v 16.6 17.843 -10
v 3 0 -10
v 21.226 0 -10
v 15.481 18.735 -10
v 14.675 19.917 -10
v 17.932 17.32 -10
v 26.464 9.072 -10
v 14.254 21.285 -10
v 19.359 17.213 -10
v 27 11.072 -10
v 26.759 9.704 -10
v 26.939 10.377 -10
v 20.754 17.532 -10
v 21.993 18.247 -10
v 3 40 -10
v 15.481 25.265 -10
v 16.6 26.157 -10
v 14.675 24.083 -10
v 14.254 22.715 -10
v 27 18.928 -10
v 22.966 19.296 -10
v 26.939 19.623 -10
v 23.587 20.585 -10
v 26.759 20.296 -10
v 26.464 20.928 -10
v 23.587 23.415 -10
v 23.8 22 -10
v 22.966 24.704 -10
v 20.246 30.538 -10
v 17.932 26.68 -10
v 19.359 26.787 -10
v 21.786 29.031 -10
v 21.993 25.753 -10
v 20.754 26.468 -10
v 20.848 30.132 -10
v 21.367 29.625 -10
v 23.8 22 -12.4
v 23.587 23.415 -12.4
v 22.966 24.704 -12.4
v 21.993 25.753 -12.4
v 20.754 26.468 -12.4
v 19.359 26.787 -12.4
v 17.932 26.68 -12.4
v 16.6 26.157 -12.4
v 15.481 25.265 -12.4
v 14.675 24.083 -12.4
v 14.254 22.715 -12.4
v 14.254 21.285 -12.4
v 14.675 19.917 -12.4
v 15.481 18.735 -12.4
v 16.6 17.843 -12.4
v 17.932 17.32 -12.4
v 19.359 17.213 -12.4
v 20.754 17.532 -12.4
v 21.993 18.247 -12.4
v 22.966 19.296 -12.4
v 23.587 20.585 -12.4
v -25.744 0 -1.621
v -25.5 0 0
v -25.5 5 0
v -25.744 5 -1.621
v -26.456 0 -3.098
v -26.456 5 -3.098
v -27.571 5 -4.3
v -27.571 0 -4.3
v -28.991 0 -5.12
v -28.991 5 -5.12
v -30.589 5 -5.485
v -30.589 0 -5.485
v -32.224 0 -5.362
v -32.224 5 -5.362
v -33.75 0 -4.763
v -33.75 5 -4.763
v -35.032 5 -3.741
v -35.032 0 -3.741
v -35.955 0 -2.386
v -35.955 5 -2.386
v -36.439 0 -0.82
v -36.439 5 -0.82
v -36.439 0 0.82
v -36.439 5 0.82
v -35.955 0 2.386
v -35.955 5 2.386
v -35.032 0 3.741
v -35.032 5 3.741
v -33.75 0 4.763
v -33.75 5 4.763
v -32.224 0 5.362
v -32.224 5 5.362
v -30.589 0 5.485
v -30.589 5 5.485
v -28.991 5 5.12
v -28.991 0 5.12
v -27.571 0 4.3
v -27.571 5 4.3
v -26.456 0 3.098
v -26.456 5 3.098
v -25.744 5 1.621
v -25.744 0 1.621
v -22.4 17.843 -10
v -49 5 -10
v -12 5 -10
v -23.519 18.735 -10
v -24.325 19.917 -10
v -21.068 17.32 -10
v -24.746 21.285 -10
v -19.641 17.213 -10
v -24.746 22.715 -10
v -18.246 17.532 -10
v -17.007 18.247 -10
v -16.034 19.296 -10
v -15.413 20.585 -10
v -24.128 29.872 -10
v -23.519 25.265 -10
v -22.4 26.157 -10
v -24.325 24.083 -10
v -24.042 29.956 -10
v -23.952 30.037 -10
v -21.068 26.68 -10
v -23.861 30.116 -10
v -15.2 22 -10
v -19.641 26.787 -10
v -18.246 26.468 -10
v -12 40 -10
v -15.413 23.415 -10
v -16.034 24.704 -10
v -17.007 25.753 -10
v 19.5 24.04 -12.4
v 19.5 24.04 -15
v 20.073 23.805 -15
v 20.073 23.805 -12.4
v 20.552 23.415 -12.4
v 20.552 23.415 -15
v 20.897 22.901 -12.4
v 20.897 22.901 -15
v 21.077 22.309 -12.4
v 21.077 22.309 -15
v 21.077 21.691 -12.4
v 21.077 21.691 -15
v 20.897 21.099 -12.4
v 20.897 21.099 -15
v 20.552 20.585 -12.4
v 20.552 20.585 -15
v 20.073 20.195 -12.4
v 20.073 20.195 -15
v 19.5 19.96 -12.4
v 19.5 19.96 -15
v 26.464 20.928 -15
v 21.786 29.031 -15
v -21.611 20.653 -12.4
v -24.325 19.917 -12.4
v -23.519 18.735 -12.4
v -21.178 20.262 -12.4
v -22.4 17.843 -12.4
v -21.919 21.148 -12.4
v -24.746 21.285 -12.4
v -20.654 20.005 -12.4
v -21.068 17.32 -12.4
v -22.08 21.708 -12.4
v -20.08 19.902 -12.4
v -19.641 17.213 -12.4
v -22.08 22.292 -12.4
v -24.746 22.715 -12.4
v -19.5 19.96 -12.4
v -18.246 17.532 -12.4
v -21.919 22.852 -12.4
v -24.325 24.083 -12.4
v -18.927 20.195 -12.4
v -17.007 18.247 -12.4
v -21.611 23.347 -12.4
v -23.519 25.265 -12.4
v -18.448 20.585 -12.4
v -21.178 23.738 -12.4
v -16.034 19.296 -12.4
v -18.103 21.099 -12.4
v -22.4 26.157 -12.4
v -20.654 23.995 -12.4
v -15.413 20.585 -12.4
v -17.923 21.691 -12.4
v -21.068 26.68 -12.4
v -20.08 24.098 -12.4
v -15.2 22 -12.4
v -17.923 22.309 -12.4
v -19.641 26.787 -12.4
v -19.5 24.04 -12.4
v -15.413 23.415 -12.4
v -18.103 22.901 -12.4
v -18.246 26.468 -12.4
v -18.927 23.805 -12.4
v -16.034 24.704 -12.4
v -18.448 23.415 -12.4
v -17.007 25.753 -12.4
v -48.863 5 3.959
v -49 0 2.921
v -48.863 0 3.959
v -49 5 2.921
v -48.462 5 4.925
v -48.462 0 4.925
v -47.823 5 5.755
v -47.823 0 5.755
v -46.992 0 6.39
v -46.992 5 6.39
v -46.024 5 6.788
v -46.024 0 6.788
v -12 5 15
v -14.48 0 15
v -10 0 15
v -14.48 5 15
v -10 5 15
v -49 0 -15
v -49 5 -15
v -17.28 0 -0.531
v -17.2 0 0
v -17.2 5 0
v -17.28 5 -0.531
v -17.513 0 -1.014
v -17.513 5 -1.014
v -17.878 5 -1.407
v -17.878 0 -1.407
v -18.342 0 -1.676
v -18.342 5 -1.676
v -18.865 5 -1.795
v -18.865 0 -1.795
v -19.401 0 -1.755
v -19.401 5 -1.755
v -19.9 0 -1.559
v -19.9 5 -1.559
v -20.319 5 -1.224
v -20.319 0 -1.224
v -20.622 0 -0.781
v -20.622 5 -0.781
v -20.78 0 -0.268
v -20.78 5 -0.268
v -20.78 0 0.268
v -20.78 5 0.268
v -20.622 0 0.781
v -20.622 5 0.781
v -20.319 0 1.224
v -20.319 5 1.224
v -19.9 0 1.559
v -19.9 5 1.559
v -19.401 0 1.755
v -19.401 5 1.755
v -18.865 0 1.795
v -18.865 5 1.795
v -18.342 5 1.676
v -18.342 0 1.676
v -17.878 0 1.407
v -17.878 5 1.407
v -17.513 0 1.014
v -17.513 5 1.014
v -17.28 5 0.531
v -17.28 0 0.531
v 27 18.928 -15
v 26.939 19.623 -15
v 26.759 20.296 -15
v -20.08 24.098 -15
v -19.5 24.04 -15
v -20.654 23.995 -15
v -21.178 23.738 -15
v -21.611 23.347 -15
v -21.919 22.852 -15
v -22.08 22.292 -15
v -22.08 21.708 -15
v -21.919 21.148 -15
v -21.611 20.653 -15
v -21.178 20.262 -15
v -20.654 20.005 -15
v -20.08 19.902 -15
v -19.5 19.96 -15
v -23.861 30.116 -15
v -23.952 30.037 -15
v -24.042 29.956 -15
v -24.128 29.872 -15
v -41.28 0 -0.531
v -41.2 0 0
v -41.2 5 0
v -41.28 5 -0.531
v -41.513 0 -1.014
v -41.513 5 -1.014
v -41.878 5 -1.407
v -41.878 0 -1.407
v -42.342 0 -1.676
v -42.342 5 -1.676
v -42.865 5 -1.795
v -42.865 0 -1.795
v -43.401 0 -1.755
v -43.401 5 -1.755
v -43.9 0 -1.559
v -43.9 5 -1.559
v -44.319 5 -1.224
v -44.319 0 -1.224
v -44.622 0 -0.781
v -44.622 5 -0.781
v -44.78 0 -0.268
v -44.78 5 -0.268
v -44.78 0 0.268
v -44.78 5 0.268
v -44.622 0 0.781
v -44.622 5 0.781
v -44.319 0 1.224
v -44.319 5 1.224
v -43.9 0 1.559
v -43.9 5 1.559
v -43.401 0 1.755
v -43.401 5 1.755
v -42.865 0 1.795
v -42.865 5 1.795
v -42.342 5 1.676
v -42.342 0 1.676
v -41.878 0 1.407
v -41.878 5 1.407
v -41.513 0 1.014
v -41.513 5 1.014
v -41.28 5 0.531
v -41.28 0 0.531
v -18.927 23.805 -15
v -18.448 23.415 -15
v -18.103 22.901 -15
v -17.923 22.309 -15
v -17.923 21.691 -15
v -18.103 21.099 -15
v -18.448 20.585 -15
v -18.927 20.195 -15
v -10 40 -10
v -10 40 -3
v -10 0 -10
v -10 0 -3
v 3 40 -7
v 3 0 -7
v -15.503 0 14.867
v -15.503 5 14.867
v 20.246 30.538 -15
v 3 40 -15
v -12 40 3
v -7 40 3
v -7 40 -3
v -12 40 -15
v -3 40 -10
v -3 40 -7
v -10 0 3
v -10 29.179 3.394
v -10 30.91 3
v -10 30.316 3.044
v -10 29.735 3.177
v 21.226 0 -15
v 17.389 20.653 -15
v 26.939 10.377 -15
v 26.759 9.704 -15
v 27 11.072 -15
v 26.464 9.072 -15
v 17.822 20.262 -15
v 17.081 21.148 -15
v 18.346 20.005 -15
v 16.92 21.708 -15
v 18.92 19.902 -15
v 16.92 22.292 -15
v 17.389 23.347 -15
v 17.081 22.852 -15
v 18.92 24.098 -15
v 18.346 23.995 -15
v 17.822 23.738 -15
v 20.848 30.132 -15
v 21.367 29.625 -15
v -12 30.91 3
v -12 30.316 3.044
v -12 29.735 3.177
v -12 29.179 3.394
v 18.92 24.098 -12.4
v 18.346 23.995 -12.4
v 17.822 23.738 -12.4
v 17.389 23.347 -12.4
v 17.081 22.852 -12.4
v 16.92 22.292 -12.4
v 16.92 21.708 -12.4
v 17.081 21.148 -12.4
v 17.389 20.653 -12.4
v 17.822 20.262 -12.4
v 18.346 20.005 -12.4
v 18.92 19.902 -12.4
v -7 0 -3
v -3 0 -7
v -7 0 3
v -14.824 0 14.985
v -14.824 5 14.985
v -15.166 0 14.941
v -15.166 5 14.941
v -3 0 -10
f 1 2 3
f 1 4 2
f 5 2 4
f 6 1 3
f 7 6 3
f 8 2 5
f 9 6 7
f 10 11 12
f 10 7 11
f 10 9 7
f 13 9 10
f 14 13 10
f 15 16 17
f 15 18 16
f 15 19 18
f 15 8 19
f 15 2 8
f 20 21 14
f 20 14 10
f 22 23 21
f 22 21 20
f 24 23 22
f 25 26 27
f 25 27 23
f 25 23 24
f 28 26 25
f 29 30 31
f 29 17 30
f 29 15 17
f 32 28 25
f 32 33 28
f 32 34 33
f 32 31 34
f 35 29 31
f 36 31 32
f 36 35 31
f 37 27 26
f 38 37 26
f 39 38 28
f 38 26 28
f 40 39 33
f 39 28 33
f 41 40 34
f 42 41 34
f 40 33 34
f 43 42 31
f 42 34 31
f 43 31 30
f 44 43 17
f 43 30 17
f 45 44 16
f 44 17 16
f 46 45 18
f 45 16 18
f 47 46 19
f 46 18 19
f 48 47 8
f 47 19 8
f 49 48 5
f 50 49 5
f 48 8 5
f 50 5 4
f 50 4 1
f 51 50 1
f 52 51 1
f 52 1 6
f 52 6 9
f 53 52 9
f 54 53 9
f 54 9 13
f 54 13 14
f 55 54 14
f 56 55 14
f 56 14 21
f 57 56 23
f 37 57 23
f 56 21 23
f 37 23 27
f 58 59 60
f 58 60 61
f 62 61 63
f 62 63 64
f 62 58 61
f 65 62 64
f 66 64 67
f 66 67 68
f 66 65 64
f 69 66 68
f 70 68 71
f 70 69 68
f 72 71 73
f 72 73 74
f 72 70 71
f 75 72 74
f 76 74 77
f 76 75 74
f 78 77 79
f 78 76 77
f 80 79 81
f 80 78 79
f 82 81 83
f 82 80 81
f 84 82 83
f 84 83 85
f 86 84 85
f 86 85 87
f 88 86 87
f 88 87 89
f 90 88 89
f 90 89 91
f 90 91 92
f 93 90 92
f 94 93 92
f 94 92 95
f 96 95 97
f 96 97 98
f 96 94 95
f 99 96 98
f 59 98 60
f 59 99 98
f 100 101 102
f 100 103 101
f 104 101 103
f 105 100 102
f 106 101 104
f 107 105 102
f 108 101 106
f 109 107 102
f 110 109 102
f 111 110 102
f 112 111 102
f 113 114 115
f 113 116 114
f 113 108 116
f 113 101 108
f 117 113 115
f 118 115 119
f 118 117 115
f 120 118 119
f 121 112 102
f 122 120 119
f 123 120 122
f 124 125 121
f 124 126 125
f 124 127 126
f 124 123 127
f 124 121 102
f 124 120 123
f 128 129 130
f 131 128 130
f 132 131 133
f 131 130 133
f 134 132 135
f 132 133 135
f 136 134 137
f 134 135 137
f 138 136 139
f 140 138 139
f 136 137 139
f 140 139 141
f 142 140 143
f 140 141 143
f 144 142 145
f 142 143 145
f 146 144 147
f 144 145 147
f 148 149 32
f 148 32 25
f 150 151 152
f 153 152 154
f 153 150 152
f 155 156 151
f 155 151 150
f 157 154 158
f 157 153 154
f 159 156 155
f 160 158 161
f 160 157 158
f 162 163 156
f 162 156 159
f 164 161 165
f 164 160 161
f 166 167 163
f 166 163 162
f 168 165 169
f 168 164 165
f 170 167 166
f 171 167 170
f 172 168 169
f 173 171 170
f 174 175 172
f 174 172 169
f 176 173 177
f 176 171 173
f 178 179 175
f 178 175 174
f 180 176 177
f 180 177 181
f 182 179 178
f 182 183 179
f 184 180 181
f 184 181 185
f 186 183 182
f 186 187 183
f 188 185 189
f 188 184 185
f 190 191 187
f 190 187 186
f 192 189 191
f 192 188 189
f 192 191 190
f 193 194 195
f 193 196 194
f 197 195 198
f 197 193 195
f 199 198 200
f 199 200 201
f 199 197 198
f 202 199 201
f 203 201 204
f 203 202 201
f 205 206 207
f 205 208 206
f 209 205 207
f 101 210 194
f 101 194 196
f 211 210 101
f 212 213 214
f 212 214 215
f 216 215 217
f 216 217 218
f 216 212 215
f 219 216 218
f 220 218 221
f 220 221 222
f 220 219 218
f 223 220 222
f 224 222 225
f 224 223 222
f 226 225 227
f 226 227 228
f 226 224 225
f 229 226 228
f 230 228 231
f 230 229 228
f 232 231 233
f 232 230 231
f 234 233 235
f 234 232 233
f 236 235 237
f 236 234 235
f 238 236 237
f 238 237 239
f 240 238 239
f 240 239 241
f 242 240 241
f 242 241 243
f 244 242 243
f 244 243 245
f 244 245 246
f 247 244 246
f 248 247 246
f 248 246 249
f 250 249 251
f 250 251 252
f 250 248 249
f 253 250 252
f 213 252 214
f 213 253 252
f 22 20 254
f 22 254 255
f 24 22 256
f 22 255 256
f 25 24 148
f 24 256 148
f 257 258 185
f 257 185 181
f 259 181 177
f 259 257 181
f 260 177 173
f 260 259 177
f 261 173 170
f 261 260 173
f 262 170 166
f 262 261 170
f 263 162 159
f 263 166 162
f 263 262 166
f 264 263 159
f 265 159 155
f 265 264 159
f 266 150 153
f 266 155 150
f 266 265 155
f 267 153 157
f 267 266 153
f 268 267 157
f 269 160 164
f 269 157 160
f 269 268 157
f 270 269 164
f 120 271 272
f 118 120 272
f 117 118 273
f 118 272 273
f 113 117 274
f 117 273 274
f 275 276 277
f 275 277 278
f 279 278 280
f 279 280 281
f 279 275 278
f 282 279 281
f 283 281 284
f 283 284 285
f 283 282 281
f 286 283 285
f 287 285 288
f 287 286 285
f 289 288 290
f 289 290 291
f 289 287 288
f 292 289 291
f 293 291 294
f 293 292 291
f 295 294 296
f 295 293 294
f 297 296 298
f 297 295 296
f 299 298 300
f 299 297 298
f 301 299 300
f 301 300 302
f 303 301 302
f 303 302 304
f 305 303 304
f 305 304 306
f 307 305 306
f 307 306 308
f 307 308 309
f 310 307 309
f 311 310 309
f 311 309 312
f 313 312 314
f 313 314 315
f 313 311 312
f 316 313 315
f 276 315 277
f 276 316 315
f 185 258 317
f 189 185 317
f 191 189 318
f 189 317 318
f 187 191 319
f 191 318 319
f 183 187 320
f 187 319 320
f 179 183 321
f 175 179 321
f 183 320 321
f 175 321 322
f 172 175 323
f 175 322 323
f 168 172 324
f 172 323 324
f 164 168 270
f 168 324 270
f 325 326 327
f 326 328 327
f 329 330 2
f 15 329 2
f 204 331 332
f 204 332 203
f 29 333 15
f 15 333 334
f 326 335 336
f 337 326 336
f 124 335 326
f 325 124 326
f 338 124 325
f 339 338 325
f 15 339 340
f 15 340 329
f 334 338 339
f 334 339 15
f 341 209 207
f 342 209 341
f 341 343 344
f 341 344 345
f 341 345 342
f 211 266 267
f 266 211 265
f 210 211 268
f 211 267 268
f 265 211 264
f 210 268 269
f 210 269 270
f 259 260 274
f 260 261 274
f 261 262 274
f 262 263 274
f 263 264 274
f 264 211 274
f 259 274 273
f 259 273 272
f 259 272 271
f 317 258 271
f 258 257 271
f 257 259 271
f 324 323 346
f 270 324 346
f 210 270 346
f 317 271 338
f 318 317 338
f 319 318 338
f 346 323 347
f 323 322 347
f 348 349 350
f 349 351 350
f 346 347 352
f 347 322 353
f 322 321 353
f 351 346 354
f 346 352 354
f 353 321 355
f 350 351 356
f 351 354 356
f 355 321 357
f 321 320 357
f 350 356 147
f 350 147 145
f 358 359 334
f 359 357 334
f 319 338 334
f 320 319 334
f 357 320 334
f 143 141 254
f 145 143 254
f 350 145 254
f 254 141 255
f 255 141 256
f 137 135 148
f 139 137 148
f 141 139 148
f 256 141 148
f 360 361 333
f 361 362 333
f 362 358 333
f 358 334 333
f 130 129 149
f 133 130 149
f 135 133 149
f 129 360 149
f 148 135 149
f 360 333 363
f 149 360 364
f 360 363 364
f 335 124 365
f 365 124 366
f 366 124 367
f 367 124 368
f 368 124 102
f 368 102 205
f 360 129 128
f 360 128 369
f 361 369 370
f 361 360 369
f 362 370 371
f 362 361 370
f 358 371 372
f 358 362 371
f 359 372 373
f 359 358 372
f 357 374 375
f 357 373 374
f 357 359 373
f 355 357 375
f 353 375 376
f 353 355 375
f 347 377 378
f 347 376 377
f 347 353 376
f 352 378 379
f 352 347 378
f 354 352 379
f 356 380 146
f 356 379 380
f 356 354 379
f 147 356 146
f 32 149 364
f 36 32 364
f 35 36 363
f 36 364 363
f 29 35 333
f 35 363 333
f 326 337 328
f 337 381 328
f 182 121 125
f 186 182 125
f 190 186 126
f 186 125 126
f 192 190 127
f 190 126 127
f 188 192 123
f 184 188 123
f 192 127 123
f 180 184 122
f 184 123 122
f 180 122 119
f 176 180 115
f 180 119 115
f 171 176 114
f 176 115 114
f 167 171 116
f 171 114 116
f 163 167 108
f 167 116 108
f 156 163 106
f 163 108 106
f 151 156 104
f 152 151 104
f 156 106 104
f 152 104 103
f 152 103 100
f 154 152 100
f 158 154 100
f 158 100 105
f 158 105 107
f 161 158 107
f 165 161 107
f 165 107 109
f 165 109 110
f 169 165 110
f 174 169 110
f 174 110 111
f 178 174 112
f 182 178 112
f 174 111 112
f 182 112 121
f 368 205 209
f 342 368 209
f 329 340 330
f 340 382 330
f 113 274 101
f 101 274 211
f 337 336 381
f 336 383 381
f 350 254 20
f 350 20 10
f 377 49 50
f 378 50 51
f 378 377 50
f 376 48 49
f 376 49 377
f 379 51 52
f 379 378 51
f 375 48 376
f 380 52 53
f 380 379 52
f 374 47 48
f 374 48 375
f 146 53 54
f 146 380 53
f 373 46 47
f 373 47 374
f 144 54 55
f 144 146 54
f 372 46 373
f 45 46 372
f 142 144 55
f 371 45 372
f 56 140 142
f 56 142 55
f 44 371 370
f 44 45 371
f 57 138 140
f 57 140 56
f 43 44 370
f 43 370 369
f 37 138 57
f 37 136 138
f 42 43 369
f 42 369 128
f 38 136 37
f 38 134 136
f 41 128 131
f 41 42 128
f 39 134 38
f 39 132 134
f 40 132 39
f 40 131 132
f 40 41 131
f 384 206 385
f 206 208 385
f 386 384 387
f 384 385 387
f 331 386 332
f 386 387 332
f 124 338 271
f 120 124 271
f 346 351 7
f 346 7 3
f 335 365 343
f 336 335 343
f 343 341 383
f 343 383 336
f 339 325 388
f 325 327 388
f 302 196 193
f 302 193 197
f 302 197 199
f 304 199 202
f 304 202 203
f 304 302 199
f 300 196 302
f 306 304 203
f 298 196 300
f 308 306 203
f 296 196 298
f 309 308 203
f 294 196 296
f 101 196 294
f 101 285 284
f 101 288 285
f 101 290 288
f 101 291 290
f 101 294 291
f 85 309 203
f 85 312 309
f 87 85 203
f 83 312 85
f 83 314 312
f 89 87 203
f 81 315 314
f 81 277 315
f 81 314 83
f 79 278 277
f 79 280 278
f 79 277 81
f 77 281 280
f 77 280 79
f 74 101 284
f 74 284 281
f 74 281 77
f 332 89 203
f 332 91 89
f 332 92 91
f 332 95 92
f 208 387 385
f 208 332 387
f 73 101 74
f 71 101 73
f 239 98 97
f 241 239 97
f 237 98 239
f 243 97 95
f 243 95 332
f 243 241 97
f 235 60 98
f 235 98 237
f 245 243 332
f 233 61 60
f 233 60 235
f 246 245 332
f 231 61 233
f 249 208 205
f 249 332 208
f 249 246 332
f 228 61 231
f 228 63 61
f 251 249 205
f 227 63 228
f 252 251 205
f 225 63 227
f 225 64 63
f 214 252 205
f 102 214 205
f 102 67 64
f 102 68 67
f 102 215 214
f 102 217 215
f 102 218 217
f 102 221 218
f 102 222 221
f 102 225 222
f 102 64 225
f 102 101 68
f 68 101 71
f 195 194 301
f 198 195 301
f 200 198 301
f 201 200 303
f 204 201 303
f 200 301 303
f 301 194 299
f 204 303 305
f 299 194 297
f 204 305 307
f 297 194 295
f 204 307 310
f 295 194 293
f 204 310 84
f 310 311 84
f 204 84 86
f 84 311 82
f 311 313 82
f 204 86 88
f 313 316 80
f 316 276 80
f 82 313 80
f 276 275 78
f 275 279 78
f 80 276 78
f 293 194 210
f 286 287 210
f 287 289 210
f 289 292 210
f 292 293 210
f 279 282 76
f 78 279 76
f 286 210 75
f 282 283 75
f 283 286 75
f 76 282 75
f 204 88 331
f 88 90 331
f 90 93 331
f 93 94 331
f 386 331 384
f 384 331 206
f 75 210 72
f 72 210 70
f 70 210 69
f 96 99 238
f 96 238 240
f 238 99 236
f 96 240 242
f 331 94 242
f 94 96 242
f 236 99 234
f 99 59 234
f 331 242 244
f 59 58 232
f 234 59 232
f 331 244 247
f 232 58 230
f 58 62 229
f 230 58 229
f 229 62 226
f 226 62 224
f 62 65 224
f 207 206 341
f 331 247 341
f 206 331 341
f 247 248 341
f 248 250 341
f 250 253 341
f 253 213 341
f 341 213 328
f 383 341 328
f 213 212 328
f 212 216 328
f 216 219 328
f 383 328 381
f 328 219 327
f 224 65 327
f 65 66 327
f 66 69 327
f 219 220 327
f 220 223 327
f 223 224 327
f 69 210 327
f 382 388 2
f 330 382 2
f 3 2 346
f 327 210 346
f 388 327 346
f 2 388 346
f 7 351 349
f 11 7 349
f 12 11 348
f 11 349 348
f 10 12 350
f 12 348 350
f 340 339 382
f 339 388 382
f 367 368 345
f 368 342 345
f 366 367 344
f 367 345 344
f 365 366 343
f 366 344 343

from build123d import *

# Parameters (mm, degrees)
SKETCH1_W                     = 30
SKETCH1_H                     = 30
BOSS_EXTRUDE1_DEPTH           = 30
SKETCH2_W                     = 20
SKETCH2_H                     = 20
CUT_EXTRUDE1_DEPTH            = 37.742346142
SKETCH3_W                     = 30
SKETCH3_H                     = 5
BOSS_EXTRUDE2_DEPTH           = 40
SKETCH4_R                     = 5.5
SKETCH4_R_2                   = 1.8
CUT_EXTRUDE2_DEPTH            = 65.420493634
CUT_EXTRUDE3_DEPTH            = 63.24949799
SKETCH5_W                     = 5
SKETCH5_H                     = 25
BOSS_EXTRUDE4_DEPTH           = 34
CHAMFER1_SIZE                 = 25
SKETCH8_R                     = 2.1
CUT_EXTRUDE4_DEPTH            = 63.657800791
SKETCH9_W                     = 5
SKETCH9_H                     = 30
BOSS_EXTRUDE5_DEPTH           = 12
CHAMFER2_SIZE                 = 10
CHAMFER2_SIZE2                = 5.773502692
SKETCH10_R                    = 2.1
CUT_EXTRUDE5_DEPTH            = 63.657800791
BODY_MOVE_COPY1_START         = -15
BODY_MOVE_COPY1_DEPTH         = 31
BODY_MOVE_COPY1_START_2       = -10
BODY_MOVE_COPY1_2_DEPTH       = 26
BODY_MOVE_COPY1_3_OUTLINE_W   = 34
BODY_MOVE_COPY1_3_OUTLINE_H   = 5
BODY_MOVE_COPY1_3_DEPTH       = 30
BODY_MOVE_COPY1_4_DEPTH       = 5
BODY_MOVE_COPY1_5_OUTLINE_R   = 5.5
BODY_MOVE_COPY1_5_OUTLINE_R_2 = 1.8
BODY_MOVE_COPY1_5_DEPTH       = 5
SKETCH11_W                    = 3
SKETCH11_H                    = 25
CUT_EXTRUDE6_DEPTH            = 25
SKETCH12_W                    = 25
SKETCH12_H                    = 25
CUT_EXTRUDE7_DEPTH            = 60.380131357
SKETCH13_W                    = 3
SKETCH13_H                    = 6
SKETCH13_W_2                  = 6
SKETCH13_H_2                  = 3
BOSS_EXTRUDE6_DEPTH           = 30
SKETCH14_R                    = 4.8
CUT_EXTRUDE9_DEPTH            = 2.4
CHAMFER3_SIZE                 = 12
CHAMFER3_SIZE2                = 25
FILLET1_R                     = 4
BOSS_EXTRUDE7_DEPTH           = 10
BOSS_EXTRUDE8_DEPTH           = 5
FILLET3_R                     = 4
FILLET4_R                     = 4


with BuildPart() as part:
    # Sketch1 → Boss-Extrude1 (new body)
    with BuildSketch(Plane(origin=(0, 0, 0), x_dir=(1, 0, 0), z_dir=(0, 1, 0))):
        Rectangle(SKETCH1_W, SKETCH1_H)
    extrude(amount=BOSS_EXTRUDE1_DEPTH)

    # Sketch2 → Cut-Extrude1 (cut, through all)
    with BuildSketch(Plane(origin=(0, 30, 0), x_dir=(1, 0, 0), z_dir=(0, 1, 0))):
        Rectangle(SKETCH2_W, SKETCH2_H)
    extrude(amount=-CUT_EXTRUDE1_DEPTH, mode=Mode.SUBTRACT)

    # Sketch3 → Boss-Extrude2 (add)
    with BuildSketch(Plane(origin=(15, 0, 0), x_dir=(0, 0, -1), z_dir=(1, 0, 0))):
        with Locations((0, 2.5)):
            Rectangle(SKETCH3_W, SKETCH3_H)
    extrude(amount=BOSS_EXTRUDE2_DEPTH)

    # Sketch4 → Cut-Extrude2 (cut, through all)
    with BuildSketch(Plane.XZ):
        with Locations(Location((31, 0, 0), (0, 0, 270))):
            Circle(SKETCH4_R)
        with Locations(Location((19, 0, 0), (0, 0, 270))):
            Circle(SKETCH4_R_2)
        with Locations(Location((43, 0, 0), (0, 0, 270))):
            Circle(SKETCH4_R_2)
    extrude(amount=-CUT_EXTRUDE2_DEPTH, mode=Mode.SUBTRACT)

    # Sketch7 → Cut-Extrude3 (cut, through all)
    with BuildSketch(Plane(origin=(0, 5, 0), x_dir=(1, 0, 0), z_dir=(0, 1, 0))):
        Polygon((15, -15), (49, -6), (49, 15), (55, 15), (55, -15), align=None)
    extrude(amount=-CUT_EXTRUDE3_DEPTH, mode=Mode.SUBTRACT)

    # Sketch5 → Boss-Extrude4 (add)
    with BuildSketch(Plane(origin=(15, 0, 0), x_dir=(0, 0, -1), z_dir=(1, 0, 0))):
        with Locations((12.5, 17.5)):
            Rectangle(SKETCH5_W, SKETCH5_H)
    extrude(amount=BOSS_EXTRUDE4_DEPTH)

    # Chamfer1
    chamfer1_edges = [part.edges().sort_by_distance(p)[0] for p in [
        (49, 30, -12.5),
    ]]
    chamfer(chamfer1_edges, length=CHAMFER1_SIZE)

    # Sketch8 → Cut-Extrude4 (cut, through all)
    with BuildSketch(Plane.XY.offset(-10)):
        with Locations((20, 22)):
            Circle(SKETCH8_R)
    extrude(amount=-CUT_EXTRUDE4_DEPTH, mode=Mode.SUBTRACT)

    # Sketch9 → Boss-Extrude5 (add)
    with BuildSketch(Plane.ZY.offset(15)):
        with Locations((-12.5, 15)):
            Rectangle(SKETCH9_W, SKETCH9_H)
    extrude(amount=BOSS_EXTRUDE5_DEPTH)

    # Chamfer2
    chamfer2_edges = [part.edges().sort_by_distance(p)[0] for p in [
        (-27, 30, -12.5),
        (-27, 0, -12.5),
    ]]
    chamfer2_side = [part.faces().sort_by_distance(p)[0] for p in [
        (-27, 15, -12.5),
    ]]
    chamfer(chamfer2_edges, length=CHAMFER2_SIZE, length2=CHAMFER2_SIZE2, reference=chamfer2_side[0])

    # Sketch10 → Cut-Extrude5 (cut, through all)
    with BuildSketch(Plane.XY.offset(-10)):
        with Locations((-19, 22)):
            Circle(SKETCH10_R)
    extrude(amount=-CUT_EXTRUDE5_DEPTH, mode=Mode.SUBTRACT)

    # Body-Move/Copy1: read off the stored shape, not the designer's step
    # Body-Move/Copy1 outline → Body-Move/Copy1 (cut)
    with BuildSketch(Plane.XY.offset(BODY_MOVE_COPY1_START)):
        Polygon((24, 30), (21.226497308, 30), (27, 20), (27, 10), (21.226497308, 0), (49, 0), (49, 5), align=None)
        with BuildLine():
            ThreePointArc((-19.5, 19.960392195), (-21.1, 22), (-19.5, 24.039607805))
            ThreePointArc((-19.5, 24.039607805), (-22.1, 22), (-19.5, 19.960392195))
        make_face()
        with BuildLine():
            ThreePointArc((19.5, 19.960392195), (17.9, 22), (19.5, 24.039607805))
            ThreePointArc((19.5, 24.039607805), (16.9, 22), (19.5, 19.960392195))
        make_face()
    extrude(amount=BODY_MOVE_COPY1_DEPTH, mode=Mode.SUBTRACT)

    # Body-Move_Copy1 2 outline → Body-Move_Copy1 2 (cut)
    with BuildSketch(Plane.XY.offset(BODY_MOVE_COPY1_START_2)):
        Polygon((24.113248654, 5), (15, 5), (15, 0), (21.226497308, 0), align=None)
    extrude(amount=BODY_MOVE_COPY1_2_DEPTH, mode=Mode.SUBTRACT)

    # Body-Move_Copy1 3 outline → Body-Move_Copy1 3 (add)
    with BuildSketch(Plane.XY.offset(BODY_MOVE_COPY1_START)):
        with Locations((-32, 2.5)):
            Rectangle(BODY_MOVE_COPY1_3_OUTLINE_W, BODY_MOVE_COPY1_3_OUTLINE_H)
    extrude(amount=BODY_MOVE_COPY1_3_DEPTH)

    # Body-Move_Copy1 4 outline → Body-Move_Copy1 4 (add)
    with BuildSketch(Plane.XY.offset(BODY_MOVE_COPY1_START)):
        Polygon((-27, 20), (-21.226497308, 30), (-24, 30), (-49, 5), (-24.113248654, 5), (-27, 10), align=None)
        with BuildLine():
            ThreePointArc((-19.5, 24.039607805), (-17.9, 22), (-19.5, 19.960392195))
            ThreePointArc((-19.5, 19.960392195), (-16.9, 22), (-19.5, 24.039607805))
        make_face()
        with BuildLine():
            ThreePointArc((19.5, 24.039607805), (21.1, 22), (19.5, 19.960392195))
            ThreePointArc((19.5, 19.960392195), (22.1, 22), (19.5, 24.039607805))
        make_face()
    extrude(amount=BODY_MOVE_COPY1_4_DEPTH)

    # Body-Move_Copy1 5 outline → Body-Move_Copy1 5 (cut)
    with BuildSketch(Plane(origin=(0, 0, 0), x_dir=(1, 0, 0), z_dir=(0, 1, 0))):
        with Locations((-31, 0)):
            Circle(BODY_MOVE_COPY1_5_OUTLINE_R)
        with Locations((-19, 0)):
            Circle(BODY_MOVE_COPY1_5_OUTLINE_R_2)
        with Locations((-43, 0)):
            Circle(BODY_MOVE_COPY1_5_OUTLINE_R_2)
        Polygon((-49, -15), (-15, -15), (-49, -6), align=None)
    extrude(amount=BODY_MOVE_COPY1_5_DEPTH, mode=Mode.SUBTRACT)

    # Sketch11 → Cut-Extrude6 (cut)
    with BuildSketch(Plane(origin=(0, 30, 0), x_dir=(1, 0, 0), z_dir=(0, 1, 0))):
        with Locations((-13.5, -2.5)):
            Rectangle(SKETCH11_W, SKETCH11_H)
    extrude(amount=-CUT_EXTRUDE6_DEPTH, mode=Mode.SUBTRACT)

    # Sketch12 → Cut-Extrude7 (cut, through all)
    with BuildSketch(Plane(origin=(0, 30, 0), x_dir=(1, 0, 0), z_dir=(0, 1, 0))):
        with Locations((2.5, -2.5)):
            Rectangle(SKETCH12_W, SKETCH12_H)
    extrude(amount=-CUT_EXTRUDE7_DEPTH, mode=Mode.SUBTRACT)

    # Sketch13 → Boss-Extrude6 (add)
    with BuildSketch(Plane(origin=(0, 30, 0), x_dir=(1, 0, 0), z_dir=(0, 1, 0))):
        with Locations((-8.5, 0)):
            Rectangle(SKETCH13_W, SKETCH13_H)
        with Locations((0, 8.5)):
            Rectangle(SKETCH13_W_2, SKETCH13_H_2)
    extrude(amount=-BOSS_EXTRUDE6_DEPTH)

    # Sketch14 → Cut-Extrude9 (cut)
    with BuildSketch(Plane.XY.offset(-10)):
        with Locations((-20, 22)):
            Circle(SKETCH14_R)
        with Locations((19, 22)):
            Circle(SKETCH14_R)
    extrude(amount=-CUT_EXTRUDE9_DEPTH, mode=Mode.SUBTRACT)

    # Chamfer3
    chamfer3_edges = [part.edges().sort_by_distance(p)[0] for p in [
        (-11, 30, 15),
    ]]
    chamfer3_side = [part.faces().sort_by_distance(p)[0] for p in [
        (-18, 30, -10.542718717),
    ]]
    chamfer(chamfer3_edges, length=CHAMFER3_SIZE, length2=CHAMFER3_SIZE2, reference=chamfer3_side[0])

    # Fillet1
    fillet1_edges = [part.edges().sort_by_distance(p)[0] for p in [
        (-49, 2.5, 6),
        (-15, 2.5, 15),
    ]]
    fillet(fillet1_edges, radius=FILLET1_R)

    # Sketch16 → Boss-Extrude7 (add)
    with BuildSketch(Plane(origin=(0, 30, 0), x_dir=(1, 0, 0), z_dir=(0, 1, 0))):
        Polygon((-12, -3), (-7, -3), (-7, 3), (-10, 3), (-10, 10), (-3, 10), (-3, 7), (3, 7), (3, 15), (-12, 15), align=None)
    extrude(amount=BOSS_EXTRUDE7_DEPTH)

    # Sketch17 → Boss-Extrude8 (add)
    with BuildSketch(Plane(origin=(0, 0, -15), x_dir=(-1, 0, 0), z_dir=(0, 0, -1))):
        Polygon((-21.226497308, 30), (-3, 40), (-3, 30), align=None)
        Polygon((12, 30), (12, 40), (24, 30), align=None)
    extrude(amount=-BOSS_EXTRUDE8_DEPTH)

    # Fillet3
    fillet3_edges = [part.edges().sort_by_distance(p)[0] for p in [
        (-11, 30, 3),
    ]]
    fillet(fillet3_edges, radius=FILLET3_R)

    # Fillet4
    # the kernel refuses this fillet: 4 mm, written as the material it takes off along each edge
    with BuildSketch(Plane(origin=(27, 10, -17.679491924), x_dir=(-0.500000000006737, -0.8660254037805489, 0), z_dir=(0, 0, 1))) as fillet4_piece_1:
        with BuildLine():
            CenterArc((FILLET4_R * 0.267949192435, -FILLET4_R), FILLET4_R, 90, 30)
            Line((-FILLET4_R * 0.232050807571, -FILLET4_R * 0.133974596219), (0, 0))
            Line((0, 0), (FILLET4_R * 0.267949192435, 0))
        make_face()
    extrude(amount=10.358983849, mode=Mode.SUBTRACT)
    with BuildSketch(Plane(origin=(27, 20, -17.679491924), x_dir=(-0.5000000000067392, 0.8660254037805477, 0), z_dir=(0, 0, 1))) as fillet4_piece_2:
        with BuildLine():
            CenterArc((FILLET4_R * 0.267949192435, FILLET4_R), FILLET4_R, 240, 30)
            Line((-FILLET4_R * 0.232050807571, FILLET4_R * 0.133974596219), (0, 0))
            Line((0, 0), (FILLET4_R * 0.267949192435, 0))
        make_face()
    extrude(amount=10.358983849, mode=Mode.SUBTRACT)
    with BuildSketch(Plane(origin=(21.226497308, 30, -17.796617535), x_dir=(0.5000000000067387, -0.8660254037805479, 0), z_dir=(0, 0, 1))) as fillet4_piece_3:
        with BuildLine():
            CenterArc((FILLET4_R * 0.27966175346, -FILLET4_R), FILLET4_R, 90, 31.248547441)
            Line((-FILLET4_R * 0.23908983086, -FILLET4_R * 0.145074977694), (0, 0))
            Line((0, 0), (FILLET4_R * 0.27966175346, 0))
        make_face()
    extrude(amount=10.59323507, mode=Mode.SUBTRACT)
    with BuildSketch(Plane(origin=(-24, 30, -15.453610172), x_dir=(0.7682212795973823, 0.6401843996644723, 0), z_dir=(0, 0, 1))) as fillet4_piece_4:
        with BuildLine():
            CenterArc((FILLET4_R * 0.0453610171873, -FILLET4_R), FILLET4_R, 90, 5.194428908)
            Line((-FILLET4_R * 0.0451747288553, -FILLET4_R * 0.0041067935323), (0, 0))
            Line((0, 0), (FILLET4_R * 0.0453610171873, 0))
        make_face()
    extrude(amount=5.907220344, mode=Mode.SUBTRACT)


solid = part.part
